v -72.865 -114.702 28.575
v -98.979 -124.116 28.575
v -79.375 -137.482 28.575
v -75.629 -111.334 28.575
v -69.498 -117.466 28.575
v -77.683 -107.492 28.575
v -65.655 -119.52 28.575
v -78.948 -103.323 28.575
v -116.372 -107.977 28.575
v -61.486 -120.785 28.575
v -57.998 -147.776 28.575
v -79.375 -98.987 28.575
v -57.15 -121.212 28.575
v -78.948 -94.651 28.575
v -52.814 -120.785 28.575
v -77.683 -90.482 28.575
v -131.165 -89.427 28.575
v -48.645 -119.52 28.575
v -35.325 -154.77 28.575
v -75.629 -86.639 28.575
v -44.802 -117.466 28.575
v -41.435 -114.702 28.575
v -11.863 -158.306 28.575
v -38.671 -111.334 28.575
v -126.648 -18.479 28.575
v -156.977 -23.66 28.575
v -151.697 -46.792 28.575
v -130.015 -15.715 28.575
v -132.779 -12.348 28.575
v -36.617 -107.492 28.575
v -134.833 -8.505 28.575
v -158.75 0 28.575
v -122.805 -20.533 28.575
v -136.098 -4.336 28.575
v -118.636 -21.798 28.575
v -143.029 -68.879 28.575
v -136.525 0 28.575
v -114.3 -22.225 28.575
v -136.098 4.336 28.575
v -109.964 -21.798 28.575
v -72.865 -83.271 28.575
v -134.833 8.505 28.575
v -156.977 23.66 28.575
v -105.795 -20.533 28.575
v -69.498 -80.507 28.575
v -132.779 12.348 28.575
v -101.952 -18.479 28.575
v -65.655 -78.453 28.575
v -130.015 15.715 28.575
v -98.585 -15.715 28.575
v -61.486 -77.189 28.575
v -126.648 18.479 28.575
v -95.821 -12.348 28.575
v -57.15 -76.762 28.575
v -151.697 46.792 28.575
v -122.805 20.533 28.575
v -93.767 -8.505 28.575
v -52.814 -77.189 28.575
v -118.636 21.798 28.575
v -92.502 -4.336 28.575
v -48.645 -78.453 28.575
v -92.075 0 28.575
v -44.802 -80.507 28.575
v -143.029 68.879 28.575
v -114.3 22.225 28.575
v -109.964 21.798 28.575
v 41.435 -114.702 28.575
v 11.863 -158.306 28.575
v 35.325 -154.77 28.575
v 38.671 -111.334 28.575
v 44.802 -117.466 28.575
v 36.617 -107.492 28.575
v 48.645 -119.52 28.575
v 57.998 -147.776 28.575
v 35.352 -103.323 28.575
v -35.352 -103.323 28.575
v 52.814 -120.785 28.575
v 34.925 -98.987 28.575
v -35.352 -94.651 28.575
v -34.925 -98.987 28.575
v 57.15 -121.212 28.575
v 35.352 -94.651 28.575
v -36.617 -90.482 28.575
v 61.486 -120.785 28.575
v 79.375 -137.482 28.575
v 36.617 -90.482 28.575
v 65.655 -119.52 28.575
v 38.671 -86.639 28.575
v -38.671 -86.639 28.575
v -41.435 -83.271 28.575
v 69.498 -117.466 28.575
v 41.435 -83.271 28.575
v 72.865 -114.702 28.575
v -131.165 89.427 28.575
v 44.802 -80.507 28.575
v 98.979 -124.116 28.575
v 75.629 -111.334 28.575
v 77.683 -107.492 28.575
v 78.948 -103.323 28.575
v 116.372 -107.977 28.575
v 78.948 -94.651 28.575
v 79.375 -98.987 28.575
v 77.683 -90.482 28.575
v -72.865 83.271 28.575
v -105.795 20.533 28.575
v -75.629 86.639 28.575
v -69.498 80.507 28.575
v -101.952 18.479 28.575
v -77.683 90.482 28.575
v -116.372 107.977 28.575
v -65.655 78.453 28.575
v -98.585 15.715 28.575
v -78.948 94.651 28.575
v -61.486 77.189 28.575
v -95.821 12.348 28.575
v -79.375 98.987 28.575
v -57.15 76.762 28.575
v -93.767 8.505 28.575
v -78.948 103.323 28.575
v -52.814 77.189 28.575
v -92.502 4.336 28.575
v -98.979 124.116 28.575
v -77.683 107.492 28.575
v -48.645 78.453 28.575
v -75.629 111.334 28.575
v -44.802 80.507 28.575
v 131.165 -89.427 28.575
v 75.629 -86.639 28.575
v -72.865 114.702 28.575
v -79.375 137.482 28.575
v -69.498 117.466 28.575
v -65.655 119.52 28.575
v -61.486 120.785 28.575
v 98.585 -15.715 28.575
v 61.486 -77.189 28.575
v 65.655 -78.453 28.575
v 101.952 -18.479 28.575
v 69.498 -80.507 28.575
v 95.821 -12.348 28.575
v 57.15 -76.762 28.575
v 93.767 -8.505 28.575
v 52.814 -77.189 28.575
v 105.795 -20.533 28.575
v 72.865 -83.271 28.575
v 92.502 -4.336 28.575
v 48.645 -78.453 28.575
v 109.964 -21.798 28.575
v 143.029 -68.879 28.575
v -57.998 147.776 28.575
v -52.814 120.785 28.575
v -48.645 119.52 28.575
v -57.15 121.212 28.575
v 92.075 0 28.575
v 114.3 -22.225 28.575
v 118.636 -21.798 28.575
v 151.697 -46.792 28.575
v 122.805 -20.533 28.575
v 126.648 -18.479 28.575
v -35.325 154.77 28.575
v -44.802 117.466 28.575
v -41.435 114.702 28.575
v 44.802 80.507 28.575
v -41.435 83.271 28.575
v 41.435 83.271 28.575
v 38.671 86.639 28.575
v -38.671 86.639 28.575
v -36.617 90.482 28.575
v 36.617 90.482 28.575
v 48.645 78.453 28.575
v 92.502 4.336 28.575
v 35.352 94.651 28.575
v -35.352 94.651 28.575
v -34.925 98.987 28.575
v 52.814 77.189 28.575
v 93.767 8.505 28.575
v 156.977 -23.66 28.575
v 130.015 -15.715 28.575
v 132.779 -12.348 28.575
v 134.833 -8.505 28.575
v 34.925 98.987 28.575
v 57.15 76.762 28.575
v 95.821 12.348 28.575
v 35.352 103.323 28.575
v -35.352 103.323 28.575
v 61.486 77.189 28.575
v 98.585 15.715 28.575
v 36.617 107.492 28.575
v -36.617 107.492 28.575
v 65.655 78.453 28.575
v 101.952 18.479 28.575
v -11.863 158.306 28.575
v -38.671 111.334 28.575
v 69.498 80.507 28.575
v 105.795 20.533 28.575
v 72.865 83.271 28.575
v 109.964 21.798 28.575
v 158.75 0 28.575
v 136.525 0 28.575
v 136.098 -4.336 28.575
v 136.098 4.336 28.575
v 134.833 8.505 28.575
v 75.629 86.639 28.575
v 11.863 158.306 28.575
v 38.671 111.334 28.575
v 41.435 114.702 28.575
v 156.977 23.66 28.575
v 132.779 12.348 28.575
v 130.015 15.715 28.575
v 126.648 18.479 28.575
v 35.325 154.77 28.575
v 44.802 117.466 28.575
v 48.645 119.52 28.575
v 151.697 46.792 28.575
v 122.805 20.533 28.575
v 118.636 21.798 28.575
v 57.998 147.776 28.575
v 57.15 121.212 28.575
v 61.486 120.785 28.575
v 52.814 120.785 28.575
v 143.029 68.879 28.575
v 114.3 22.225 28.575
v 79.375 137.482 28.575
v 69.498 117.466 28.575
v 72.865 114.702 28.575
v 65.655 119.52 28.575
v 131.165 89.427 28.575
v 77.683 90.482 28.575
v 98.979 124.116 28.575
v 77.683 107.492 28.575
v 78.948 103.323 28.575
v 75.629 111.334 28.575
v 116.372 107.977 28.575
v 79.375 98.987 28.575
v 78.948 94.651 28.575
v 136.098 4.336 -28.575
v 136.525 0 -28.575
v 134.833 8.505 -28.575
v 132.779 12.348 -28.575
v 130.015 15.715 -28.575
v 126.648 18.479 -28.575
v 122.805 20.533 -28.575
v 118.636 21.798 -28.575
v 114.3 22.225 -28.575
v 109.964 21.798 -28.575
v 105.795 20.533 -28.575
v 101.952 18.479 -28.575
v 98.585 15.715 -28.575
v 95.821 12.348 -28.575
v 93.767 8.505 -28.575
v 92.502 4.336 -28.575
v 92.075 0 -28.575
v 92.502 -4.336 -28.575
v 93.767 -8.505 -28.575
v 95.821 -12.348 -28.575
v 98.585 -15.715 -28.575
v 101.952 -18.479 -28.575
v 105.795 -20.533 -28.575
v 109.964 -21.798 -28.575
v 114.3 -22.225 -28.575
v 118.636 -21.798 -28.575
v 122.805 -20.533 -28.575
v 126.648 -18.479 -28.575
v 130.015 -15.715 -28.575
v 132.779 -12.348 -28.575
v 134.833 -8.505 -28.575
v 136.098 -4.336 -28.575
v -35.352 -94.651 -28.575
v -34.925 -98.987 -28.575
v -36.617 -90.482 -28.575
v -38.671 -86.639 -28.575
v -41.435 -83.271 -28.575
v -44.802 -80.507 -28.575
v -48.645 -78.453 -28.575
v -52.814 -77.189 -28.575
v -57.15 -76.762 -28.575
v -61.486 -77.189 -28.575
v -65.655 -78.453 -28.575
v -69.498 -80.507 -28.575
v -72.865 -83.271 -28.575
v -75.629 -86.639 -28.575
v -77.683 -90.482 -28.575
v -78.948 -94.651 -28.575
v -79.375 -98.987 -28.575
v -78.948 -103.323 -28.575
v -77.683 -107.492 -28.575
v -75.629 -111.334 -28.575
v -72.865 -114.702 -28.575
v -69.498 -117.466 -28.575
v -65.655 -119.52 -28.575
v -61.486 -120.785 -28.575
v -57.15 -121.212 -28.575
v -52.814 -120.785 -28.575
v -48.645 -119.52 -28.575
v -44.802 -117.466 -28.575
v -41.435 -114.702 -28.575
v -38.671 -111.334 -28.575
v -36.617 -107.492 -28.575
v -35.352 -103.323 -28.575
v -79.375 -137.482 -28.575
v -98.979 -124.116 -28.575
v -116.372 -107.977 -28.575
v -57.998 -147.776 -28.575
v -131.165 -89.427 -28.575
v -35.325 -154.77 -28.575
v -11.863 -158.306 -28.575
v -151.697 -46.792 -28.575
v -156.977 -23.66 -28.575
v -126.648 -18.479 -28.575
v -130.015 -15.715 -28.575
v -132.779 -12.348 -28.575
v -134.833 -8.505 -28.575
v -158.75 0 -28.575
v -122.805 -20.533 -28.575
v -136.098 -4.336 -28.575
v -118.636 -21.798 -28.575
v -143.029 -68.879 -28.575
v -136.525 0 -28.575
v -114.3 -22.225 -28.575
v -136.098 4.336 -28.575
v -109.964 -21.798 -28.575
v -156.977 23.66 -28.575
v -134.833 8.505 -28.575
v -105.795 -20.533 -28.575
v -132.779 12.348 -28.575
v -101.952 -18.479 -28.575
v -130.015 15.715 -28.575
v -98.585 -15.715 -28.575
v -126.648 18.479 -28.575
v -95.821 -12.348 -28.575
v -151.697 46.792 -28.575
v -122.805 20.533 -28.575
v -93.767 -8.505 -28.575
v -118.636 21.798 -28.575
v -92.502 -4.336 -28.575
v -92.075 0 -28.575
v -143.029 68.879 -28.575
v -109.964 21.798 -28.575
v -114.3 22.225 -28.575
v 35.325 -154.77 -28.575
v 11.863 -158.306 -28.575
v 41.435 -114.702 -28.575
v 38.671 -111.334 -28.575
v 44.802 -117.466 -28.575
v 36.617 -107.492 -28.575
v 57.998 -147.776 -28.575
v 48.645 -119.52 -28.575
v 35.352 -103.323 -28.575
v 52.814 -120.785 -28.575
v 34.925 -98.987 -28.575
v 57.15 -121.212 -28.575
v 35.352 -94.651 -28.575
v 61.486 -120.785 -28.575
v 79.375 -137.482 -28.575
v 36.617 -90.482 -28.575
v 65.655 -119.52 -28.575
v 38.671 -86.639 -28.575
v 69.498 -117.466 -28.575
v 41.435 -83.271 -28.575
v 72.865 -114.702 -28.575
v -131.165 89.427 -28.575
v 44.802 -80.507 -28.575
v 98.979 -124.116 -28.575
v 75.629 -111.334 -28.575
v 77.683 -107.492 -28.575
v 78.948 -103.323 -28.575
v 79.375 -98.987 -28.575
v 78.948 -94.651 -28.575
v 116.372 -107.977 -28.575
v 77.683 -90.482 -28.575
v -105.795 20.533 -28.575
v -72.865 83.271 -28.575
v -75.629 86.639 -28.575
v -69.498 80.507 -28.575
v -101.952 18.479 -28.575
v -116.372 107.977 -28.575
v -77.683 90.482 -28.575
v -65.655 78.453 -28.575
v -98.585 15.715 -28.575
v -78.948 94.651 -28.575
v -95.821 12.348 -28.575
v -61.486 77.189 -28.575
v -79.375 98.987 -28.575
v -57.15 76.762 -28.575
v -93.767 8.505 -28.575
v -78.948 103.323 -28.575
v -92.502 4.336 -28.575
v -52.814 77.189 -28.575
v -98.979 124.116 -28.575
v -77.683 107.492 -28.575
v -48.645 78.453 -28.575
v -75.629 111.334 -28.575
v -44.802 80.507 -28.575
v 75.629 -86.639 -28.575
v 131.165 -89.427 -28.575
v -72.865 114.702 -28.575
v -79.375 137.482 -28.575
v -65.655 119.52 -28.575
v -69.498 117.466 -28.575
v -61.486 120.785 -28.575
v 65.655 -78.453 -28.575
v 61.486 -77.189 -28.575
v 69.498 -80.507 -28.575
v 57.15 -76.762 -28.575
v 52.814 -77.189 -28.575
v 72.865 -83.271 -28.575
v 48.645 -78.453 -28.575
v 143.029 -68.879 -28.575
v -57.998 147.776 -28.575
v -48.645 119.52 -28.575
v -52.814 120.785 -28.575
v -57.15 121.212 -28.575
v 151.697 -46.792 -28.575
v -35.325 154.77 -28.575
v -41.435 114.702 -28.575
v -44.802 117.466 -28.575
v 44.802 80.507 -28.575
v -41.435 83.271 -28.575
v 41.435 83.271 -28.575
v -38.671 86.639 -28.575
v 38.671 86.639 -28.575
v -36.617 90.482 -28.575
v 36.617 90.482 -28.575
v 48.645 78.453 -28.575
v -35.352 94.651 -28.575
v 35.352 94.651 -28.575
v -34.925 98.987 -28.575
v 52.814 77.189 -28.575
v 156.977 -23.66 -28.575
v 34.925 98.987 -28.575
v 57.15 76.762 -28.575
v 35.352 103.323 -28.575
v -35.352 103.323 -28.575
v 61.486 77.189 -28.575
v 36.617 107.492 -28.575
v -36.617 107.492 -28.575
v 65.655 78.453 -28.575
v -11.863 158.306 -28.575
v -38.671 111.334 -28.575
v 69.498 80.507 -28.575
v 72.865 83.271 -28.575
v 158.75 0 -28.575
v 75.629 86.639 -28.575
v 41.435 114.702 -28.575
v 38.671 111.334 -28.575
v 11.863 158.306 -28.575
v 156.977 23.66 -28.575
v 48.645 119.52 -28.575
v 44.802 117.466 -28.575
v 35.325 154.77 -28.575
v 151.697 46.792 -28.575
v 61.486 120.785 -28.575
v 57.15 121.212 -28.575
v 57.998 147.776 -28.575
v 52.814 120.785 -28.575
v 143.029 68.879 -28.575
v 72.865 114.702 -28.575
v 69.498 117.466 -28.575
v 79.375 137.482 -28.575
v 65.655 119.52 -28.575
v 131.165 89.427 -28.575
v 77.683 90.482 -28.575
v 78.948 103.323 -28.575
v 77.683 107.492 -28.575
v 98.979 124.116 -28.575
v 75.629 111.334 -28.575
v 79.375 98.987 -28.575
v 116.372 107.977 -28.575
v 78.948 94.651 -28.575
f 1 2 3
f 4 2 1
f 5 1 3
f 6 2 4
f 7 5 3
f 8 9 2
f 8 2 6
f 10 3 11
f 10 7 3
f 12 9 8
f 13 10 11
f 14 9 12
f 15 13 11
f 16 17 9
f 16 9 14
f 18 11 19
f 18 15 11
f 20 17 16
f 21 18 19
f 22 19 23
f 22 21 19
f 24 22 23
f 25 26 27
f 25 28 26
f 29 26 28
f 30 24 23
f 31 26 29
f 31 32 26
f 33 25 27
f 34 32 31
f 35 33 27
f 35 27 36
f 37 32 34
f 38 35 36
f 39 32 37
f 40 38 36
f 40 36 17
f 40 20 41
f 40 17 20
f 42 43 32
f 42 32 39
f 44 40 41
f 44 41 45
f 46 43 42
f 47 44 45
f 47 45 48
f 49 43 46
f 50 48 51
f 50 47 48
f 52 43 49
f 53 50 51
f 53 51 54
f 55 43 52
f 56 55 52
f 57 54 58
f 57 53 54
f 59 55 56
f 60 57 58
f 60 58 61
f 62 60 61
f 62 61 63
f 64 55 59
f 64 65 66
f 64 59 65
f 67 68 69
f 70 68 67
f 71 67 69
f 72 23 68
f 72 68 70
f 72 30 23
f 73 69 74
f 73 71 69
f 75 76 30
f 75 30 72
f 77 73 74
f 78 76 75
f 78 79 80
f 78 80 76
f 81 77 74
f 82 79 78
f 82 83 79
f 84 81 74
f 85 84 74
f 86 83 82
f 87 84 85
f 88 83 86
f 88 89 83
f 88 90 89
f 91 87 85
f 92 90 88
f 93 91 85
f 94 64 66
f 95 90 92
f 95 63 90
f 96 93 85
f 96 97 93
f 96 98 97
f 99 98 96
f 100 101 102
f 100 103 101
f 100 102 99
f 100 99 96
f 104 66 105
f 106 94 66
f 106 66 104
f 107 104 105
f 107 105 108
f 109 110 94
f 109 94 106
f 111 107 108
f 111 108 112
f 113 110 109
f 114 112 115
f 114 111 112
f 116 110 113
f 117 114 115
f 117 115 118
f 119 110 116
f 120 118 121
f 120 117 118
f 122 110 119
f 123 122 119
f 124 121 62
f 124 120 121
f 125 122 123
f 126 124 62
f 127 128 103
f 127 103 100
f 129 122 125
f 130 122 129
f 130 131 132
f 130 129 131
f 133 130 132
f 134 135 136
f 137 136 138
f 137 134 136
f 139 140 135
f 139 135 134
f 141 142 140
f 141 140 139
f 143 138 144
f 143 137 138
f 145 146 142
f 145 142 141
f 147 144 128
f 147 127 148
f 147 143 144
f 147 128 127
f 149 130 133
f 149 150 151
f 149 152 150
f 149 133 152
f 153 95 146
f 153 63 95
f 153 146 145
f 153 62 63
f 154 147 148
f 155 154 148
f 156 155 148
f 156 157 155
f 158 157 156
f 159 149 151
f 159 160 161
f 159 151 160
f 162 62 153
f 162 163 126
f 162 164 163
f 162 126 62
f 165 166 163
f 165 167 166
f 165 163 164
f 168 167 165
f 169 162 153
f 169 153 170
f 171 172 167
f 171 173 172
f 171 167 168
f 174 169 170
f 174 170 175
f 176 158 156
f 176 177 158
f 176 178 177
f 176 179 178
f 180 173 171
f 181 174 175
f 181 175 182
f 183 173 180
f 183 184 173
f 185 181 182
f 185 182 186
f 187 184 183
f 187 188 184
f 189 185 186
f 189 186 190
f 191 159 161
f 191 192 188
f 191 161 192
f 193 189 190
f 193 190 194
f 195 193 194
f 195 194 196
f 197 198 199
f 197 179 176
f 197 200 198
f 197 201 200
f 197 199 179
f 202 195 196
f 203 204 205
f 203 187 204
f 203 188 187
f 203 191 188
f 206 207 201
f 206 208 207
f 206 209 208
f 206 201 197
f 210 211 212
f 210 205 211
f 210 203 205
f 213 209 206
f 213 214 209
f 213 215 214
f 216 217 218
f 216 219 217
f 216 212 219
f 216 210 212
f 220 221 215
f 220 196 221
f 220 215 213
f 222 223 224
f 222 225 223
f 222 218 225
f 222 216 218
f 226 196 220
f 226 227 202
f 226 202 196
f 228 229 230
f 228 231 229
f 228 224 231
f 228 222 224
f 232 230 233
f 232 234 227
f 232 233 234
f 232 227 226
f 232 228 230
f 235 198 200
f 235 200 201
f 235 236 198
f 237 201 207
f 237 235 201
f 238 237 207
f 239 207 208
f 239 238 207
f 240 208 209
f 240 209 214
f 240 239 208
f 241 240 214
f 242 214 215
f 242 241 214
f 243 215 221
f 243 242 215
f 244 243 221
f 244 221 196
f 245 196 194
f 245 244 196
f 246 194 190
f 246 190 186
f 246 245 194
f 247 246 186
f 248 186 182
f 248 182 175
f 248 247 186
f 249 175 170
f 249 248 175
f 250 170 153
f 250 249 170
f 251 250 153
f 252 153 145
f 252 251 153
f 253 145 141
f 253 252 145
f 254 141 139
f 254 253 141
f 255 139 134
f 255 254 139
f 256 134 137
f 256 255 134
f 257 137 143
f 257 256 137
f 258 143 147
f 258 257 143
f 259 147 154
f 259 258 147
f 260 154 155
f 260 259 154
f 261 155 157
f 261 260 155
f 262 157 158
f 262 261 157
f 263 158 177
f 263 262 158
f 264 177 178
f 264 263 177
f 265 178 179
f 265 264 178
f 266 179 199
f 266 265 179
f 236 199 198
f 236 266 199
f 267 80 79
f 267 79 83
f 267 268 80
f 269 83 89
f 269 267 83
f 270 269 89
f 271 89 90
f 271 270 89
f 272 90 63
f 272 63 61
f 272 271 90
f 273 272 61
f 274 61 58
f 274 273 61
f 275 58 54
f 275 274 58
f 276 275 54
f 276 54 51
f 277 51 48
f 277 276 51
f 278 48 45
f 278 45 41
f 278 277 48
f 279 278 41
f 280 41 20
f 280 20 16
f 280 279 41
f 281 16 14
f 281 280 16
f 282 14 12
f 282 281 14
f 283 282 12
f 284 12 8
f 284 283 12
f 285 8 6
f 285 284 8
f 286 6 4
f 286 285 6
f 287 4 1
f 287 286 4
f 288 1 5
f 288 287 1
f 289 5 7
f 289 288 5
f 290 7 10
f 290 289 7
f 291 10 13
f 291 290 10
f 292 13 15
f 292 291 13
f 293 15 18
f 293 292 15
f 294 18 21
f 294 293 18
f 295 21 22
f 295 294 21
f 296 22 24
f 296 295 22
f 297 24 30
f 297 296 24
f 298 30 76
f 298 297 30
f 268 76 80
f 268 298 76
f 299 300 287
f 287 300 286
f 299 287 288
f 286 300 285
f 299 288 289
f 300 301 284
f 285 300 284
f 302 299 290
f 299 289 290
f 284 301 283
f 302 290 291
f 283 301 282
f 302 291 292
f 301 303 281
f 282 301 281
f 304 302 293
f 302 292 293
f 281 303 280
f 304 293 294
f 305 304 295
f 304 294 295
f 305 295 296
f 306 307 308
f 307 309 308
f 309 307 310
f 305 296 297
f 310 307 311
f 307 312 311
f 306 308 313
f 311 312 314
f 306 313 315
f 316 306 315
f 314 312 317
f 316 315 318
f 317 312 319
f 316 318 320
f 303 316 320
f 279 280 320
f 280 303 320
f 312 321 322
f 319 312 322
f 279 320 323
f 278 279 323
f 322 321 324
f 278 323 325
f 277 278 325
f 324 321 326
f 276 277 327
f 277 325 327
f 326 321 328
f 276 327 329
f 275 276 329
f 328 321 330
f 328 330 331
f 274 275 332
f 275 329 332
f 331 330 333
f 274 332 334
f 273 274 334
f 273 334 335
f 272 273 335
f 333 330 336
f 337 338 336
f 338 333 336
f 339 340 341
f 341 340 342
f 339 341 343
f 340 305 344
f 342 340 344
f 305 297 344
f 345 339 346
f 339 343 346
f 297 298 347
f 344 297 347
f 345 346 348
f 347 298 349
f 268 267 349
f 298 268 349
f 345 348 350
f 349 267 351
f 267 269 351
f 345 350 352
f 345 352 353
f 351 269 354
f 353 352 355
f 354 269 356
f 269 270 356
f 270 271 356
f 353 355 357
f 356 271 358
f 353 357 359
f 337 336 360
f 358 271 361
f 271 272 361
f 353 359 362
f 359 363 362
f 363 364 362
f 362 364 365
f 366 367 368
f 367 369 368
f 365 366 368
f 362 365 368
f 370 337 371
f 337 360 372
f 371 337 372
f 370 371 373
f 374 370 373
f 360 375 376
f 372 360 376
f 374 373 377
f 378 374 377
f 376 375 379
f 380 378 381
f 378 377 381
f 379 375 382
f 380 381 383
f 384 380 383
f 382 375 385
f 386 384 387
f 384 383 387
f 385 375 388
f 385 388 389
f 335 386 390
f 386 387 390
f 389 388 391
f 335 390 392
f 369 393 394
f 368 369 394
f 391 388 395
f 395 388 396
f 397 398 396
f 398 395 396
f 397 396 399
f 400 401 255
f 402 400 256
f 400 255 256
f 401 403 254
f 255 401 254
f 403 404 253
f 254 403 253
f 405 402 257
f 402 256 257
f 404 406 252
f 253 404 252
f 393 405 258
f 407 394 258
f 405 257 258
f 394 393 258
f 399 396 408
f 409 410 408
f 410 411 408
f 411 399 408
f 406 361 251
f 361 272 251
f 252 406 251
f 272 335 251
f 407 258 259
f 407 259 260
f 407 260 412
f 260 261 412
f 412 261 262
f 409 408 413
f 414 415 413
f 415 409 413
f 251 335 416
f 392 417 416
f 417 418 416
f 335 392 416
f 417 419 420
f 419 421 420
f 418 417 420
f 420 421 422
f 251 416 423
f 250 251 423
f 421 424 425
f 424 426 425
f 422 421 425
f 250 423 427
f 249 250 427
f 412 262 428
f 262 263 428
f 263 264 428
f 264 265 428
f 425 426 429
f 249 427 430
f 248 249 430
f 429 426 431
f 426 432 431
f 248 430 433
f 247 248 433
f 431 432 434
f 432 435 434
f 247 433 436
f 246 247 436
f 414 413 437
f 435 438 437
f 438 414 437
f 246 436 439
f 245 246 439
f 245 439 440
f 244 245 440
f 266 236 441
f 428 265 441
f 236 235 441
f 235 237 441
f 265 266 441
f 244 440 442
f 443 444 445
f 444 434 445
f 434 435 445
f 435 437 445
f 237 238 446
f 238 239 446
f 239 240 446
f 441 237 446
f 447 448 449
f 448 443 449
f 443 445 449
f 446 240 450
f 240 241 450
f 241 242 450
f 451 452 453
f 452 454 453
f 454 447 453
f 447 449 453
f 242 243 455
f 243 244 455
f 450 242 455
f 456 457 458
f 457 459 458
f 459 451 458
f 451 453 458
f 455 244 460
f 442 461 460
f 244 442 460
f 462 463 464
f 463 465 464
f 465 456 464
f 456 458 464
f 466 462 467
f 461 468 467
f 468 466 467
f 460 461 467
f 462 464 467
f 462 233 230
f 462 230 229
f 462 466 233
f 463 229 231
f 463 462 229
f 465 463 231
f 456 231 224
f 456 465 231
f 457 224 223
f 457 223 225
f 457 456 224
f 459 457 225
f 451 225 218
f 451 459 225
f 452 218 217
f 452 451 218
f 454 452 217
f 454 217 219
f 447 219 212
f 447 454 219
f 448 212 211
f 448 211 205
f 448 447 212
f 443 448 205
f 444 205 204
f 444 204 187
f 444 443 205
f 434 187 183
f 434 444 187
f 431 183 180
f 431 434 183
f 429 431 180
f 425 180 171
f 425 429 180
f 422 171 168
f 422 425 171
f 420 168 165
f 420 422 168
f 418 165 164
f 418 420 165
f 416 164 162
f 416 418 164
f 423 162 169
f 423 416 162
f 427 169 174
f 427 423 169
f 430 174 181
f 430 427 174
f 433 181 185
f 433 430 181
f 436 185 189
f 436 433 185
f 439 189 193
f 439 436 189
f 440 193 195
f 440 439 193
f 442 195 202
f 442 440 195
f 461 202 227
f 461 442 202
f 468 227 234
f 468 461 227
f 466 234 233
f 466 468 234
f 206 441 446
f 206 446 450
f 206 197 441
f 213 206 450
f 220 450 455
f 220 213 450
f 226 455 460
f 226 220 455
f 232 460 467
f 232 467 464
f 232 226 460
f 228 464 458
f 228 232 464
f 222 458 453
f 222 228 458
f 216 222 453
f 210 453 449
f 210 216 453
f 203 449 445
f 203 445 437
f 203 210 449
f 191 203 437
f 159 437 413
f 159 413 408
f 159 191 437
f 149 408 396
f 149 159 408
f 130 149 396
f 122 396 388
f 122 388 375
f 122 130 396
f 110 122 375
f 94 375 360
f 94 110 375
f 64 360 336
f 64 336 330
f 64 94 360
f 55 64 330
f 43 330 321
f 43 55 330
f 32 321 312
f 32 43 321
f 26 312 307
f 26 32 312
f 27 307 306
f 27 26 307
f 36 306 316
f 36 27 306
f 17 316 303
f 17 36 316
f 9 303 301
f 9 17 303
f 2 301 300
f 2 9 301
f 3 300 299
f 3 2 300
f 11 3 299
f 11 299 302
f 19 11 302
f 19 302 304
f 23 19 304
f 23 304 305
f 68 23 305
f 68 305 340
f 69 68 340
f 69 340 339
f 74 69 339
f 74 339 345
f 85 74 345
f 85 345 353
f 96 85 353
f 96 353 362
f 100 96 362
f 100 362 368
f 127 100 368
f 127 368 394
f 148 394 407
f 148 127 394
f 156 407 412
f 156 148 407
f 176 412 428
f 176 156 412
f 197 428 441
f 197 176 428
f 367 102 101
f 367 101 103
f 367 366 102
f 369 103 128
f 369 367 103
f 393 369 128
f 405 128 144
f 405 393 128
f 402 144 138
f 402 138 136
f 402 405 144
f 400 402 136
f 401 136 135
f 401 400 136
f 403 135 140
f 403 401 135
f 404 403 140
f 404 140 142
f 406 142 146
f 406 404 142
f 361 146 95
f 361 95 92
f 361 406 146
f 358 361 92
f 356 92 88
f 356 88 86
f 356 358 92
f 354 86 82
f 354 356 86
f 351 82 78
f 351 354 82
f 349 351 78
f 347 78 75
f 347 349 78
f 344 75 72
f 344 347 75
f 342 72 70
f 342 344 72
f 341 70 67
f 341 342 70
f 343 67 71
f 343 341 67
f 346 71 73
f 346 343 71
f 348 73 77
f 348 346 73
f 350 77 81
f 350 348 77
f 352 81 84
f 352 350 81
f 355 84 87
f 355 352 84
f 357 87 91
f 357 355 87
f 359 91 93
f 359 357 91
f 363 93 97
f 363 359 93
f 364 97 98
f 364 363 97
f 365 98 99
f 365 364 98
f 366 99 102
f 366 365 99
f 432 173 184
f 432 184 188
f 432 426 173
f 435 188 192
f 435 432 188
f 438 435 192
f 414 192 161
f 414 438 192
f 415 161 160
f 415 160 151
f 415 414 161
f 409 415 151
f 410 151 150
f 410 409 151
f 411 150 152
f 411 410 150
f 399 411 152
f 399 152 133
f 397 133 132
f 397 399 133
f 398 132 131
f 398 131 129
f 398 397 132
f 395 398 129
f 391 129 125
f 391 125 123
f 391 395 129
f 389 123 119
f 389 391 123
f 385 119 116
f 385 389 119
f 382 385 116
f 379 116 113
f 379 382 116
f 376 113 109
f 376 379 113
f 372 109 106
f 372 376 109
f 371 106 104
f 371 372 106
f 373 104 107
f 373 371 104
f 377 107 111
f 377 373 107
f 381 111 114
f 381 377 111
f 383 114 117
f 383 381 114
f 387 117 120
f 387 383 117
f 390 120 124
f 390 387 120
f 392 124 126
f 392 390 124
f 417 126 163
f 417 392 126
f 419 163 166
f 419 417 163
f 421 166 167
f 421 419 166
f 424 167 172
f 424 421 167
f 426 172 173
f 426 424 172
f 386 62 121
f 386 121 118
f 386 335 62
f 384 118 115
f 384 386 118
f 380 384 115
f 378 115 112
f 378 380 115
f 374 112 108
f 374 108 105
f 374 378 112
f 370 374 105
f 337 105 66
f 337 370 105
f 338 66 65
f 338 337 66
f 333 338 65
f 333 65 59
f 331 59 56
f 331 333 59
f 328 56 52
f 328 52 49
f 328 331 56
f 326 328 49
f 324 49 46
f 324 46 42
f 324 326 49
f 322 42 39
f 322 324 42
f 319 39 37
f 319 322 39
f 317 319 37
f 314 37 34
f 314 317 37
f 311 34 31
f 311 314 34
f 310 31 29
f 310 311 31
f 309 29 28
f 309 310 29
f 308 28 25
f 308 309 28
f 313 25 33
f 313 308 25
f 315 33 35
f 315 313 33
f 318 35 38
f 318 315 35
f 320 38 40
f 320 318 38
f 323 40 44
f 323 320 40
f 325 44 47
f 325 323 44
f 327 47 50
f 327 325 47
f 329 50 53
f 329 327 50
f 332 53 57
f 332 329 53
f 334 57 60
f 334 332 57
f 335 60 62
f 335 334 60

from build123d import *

# Parameters (mm, degrees)
SKETCH1_R           = 158.75
SKETCH1_R_2         = 22.225
BOSS_EXTRUDE1_DEPTH = 28.575


with BuildPart() as part:
    # Sketch1 → Boss-Extrude1 (new, symmetric)
    with BuildSketch(Plane(origin=(0, 0, 0), x_dir=(0, 1, 0), z_dir=(0, 0, 1))):
        with Locations(Location((0, 0, 0), (0, 0, 270))):
            Circle(SKETCH1_R)
        with Locations(Location((0, 114.3, 0), (0, 0, 270))):
            Circle(SKETCH1_R_2, mode=Mode.SUBTRACT)
        with Locations(Location((98.986703653, 57.15, 0), (0, 0, 270))):
            Circle(SKETCH1_R_2, mode=Mode.SUBTRACT)
        with Locations(Location((98.986703653, -57.15, 0), (0, 0, 270))):
            Circle(SKETCH1_R_2, mode=Mode.SUBTRACT)
        with Locations(Location((0, -114.3, 0), (0, 0, 270))):
            Circle(SKETCH1_R_2, mode=Mode.SUBTRACT)
        with Locations(Location((-98.986703653, -57.15, 0), (0, 0, 270))):
            Circle(SKETCH1_R_2, mode=Mode.SUBTRACT)
        with Locations(Location((-98.986703653, 57.15, 0), (0, 0, 270))):
            Circle(SKETCH1_R_2, mode=Mode.SUBTRACT)
    extrude(amount=BOSS_EXTRUDE1_DEPTH, both=True)


solid = part.part
